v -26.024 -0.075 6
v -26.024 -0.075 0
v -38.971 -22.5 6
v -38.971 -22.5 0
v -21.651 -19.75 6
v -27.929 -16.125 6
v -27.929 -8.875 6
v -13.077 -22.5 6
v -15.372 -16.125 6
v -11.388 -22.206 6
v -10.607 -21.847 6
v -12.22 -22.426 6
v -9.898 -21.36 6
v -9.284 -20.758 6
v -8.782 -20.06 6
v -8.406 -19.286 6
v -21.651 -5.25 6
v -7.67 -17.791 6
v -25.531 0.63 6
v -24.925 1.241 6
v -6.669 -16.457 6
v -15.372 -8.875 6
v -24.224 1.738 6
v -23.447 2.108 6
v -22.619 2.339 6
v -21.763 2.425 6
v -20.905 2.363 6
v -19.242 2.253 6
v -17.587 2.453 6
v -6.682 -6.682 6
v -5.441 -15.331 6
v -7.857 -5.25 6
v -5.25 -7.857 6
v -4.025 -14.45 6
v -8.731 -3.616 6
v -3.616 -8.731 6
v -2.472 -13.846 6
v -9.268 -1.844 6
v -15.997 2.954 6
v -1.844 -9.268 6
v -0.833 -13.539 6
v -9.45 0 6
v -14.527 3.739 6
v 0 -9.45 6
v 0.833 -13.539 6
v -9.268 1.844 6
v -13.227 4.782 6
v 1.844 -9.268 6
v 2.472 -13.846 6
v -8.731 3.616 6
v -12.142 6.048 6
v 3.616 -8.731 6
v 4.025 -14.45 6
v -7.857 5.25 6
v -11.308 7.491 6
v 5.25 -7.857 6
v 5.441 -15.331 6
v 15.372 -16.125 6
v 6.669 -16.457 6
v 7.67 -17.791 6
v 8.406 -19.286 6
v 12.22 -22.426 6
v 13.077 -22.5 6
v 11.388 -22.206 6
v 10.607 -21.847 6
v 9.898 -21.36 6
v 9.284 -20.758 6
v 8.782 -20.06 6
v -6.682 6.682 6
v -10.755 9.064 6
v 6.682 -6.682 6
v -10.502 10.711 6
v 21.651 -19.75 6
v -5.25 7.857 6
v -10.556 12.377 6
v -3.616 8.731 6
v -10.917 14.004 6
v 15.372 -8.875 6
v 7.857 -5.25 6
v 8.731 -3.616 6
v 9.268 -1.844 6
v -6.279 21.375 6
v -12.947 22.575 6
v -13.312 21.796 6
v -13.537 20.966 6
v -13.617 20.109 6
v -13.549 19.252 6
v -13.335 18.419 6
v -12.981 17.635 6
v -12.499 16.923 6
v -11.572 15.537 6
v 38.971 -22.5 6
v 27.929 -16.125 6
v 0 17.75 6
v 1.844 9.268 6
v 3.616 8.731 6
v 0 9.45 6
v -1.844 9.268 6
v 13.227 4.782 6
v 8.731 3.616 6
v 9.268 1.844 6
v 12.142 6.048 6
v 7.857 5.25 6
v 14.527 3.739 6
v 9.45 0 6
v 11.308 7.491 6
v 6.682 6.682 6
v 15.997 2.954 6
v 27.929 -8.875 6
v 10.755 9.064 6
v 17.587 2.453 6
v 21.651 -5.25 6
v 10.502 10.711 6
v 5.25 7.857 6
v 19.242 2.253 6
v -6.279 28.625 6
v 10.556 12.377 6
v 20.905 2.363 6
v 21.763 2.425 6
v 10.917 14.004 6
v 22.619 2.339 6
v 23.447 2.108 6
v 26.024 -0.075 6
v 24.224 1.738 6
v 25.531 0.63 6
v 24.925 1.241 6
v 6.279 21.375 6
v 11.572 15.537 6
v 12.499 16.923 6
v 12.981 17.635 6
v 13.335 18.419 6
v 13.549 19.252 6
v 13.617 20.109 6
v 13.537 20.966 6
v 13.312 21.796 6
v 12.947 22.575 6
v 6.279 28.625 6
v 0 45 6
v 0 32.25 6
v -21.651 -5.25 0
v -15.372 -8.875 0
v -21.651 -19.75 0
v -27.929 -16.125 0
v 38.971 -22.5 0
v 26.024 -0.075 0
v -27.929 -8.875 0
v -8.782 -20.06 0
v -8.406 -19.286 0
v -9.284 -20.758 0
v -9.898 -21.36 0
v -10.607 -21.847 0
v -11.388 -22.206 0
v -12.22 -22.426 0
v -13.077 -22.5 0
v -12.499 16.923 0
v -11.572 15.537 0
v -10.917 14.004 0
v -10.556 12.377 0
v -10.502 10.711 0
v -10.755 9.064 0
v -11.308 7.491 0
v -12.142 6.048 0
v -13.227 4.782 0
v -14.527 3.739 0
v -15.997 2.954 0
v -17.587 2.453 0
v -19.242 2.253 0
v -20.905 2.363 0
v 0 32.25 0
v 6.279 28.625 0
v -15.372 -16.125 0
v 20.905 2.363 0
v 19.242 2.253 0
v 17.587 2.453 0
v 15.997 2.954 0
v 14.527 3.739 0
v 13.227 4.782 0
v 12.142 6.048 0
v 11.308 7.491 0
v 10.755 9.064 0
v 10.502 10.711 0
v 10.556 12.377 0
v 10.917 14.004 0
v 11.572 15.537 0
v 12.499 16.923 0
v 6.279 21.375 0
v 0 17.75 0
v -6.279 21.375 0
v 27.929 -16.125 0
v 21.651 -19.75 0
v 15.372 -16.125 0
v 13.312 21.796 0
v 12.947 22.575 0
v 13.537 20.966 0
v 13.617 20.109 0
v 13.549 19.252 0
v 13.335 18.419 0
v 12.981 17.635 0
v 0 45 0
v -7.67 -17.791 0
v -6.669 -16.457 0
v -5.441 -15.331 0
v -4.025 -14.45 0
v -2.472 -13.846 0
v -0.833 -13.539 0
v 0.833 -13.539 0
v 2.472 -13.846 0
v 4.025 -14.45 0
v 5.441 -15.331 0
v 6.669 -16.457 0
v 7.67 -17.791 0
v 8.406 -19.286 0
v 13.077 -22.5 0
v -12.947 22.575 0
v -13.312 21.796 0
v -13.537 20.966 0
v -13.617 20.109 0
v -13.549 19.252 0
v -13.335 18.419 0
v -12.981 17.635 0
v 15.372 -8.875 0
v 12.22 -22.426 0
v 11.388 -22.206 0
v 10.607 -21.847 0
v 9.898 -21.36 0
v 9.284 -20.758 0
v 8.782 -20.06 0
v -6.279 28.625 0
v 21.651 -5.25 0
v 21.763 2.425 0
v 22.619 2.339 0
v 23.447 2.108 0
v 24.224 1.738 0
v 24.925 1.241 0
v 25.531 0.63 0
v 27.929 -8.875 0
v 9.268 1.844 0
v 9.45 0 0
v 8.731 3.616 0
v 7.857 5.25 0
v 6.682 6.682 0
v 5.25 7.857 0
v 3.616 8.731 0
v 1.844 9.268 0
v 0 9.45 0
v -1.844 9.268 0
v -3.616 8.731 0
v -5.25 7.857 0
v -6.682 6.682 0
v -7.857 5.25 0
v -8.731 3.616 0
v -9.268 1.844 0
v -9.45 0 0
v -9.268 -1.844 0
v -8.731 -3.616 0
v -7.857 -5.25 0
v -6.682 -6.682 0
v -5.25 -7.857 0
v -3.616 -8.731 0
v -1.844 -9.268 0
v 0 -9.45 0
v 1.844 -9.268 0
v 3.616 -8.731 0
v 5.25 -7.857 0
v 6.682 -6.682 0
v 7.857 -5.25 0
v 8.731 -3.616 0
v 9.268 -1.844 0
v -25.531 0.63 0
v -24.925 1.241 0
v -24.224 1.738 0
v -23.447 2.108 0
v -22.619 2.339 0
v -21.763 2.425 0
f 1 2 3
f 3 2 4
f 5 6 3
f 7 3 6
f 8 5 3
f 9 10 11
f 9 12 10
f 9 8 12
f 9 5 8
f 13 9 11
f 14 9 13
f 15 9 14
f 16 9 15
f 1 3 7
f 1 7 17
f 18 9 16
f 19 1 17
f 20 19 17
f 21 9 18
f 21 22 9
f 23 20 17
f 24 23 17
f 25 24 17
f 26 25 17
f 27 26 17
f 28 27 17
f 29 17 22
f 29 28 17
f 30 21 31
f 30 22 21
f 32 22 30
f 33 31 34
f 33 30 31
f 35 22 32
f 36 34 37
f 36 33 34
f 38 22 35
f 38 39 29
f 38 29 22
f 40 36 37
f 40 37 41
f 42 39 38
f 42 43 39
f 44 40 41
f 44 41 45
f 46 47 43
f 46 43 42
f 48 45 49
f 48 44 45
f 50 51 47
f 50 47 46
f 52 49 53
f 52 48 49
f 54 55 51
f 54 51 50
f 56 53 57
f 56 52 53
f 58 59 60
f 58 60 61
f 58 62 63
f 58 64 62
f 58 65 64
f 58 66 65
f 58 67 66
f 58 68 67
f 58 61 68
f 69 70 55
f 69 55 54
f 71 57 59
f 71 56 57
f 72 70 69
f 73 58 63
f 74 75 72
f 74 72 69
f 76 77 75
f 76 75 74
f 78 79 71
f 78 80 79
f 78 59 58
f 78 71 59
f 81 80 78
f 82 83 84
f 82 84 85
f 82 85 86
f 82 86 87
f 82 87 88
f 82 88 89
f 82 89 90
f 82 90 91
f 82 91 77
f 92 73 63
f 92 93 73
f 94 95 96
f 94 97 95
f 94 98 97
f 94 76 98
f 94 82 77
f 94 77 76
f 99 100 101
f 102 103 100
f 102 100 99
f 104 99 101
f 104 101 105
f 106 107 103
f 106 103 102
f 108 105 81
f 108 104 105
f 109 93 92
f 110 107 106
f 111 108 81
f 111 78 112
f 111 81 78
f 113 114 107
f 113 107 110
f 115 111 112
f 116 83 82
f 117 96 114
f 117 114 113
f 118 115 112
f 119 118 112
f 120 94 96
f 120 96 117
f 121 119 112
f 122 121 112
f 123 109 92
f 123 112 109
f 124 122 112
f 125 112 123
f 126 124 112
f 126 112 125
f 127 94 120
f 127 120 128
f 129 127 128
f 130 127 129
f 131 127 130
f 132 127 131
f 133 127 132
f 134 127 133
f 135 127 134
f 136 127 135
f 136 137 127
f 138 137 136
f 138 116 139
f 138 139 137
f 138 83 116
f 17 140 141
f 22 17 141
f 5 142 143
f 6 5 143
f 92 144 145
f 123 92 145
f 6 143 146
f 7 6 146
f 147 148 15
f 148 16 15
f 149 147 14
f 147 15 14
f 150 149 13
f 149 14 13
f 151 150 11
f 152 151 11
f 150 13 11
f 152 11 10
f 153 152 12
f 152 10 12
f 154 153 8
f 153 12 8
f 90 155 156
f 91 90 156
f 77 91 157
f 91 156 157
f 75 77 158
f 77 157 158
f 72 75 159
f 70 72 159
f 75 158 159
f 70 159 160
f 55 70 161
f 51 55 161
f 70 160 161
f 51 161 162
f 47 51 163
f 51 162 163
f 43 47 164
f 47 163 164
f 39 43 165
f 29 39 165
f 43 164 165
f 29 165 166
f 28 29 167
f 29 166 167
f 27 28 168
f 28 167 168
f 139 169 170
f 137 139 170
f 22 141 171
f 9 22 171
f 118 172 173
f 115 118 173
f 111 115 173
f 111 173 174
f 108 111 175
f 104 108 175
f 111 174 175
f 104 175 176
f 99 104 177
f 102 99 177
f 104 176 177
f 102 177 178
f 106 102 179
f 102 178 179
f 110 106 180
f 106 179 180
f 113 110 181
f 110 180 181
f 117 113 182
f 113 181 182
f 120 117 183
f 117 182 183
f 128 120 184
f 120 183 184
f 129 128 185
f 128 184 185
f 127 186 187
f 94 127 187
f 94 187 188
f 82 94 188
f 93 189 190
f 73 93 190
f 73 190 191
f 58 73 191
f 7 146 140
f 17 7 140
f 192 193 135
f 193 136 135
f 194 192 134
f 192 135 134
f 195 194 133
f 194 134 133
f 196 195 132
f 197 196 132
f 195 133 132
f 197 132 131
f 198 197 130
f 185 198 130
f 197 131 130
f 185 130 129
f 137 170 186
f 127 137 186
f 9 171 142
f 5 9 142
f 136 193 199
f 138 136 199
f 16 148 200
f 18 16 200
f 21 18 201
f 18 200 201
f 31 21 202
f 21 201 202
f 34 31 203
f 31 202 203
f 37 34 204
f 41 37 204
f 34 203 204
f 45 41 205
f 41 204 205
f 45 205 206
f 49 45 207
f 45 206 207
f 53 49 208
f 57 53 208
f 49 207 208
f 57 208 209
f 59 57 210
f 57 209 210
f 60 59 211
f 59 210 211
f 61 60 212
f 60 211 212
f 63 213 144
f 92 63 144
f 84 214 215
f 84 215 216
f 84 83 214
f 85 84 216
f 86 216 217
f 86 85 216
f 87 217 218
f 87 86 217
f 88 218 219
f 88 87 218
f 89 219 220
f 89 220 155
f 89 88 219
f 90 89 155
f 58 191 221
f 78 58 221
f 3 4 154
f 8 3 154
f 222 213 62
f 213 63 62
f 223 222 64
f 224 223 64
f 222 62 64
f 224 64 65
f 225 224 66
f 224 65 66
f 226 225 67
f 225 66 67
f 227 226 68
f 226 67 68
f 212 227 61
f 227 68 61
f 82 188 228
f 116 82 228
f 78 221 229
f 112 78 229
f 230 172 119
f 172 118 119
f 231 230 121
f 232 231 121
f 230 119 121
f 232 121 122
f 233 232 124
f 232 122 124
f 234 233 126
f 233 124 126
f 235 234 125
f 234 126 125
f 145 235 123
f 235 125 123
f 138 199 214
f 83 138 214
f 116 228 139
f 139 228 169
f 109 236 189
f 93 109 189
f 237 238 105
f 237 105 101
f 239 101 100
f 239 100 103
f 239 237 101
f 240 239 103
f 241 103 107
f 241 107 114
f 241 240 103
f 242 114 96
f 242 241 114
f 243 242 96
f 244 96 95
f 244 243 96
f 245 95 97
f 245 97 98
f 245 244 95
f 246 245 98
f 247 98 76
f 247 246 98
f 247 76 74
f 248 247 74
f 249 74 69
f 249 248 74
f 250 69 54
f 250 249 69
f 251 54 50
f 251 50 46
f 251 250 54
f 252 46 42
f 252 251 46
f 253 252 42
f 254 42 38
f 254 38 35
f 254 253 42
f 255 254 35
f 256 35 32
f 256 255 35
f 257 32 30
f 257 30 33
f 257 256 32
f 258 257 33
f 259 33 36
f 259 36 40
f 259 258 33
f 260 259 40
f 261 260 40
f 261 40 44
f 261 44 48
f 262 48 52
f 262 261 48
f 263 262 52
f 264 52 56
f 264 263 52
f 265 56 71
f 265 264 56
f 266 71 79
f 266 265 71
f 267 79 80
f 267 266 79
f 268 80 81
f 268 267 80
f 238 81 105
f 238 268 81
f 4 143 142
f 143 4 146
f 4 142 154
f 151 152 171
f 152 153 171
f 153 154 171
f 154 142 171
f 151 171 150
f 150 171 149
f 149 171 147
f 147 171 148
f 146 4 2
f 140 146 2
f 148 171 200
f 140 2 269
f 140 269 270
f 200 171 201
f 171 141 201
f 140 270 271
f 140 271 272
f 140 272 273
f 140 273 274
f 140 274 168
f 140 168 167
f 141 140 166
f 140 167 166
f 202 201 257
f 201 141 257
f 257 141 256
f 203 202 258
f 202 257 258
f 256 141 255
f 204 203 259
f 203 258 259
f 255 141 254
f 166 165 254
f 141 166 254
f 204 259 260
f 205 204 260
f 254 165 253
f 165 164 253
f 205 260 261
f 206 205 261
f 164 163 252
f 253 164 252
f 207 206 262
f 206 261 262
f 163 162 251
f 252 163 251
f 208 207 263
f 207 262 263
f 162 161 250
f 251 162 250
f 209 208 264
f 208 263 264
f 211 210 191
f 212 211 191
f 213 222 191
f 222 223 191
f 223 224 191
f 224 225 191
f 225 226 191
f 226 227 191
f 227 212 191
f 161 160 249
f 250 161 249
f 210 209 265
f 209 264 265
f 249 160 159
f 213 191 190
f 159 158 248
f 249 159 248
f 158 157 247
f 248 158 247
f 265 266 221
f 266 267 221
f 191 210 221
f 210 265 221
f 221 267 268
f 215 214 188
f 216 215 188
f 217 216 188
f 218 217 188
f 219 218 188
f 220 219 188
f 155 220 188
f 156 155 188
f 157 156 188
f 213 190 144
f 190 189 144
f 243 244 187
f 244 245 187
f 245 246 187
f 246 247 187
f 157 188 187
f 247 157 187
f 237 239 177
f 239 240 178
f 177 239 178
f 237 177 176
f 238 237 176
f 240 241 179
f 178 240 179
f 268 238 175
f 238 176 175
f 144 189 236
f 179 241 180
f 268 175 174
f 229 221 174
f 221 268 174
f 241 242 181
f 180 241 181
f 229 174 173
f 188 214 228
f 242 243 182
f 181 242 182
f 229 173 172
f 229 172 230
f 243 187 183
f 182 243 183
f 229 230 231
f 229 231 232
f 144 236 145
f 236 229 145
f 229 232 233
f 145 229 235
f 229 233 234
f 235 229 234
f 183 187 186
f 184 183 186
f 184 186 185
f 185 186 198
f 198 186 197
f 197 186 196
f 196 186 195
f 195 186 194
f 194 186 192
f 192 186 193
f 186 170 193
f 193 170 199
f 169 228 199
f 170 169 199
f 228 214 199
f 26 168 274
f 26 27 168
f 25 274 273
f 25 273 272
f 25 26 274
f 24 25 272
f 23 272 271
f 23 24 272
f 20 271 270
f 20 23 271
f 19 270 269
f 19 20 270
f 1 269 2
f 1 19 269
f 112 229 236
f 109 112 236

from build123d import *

# Parameters (mm, degrees)
F0_R     = 9.45
F1_DEPTH = 6
F2_R     = 5


with BuildPart() as f1:
    # F0 (on Top) → F1 (new body)
    with BuildSketch(Plane.XY):
        with BuildLine():
            Line((14.9855715851, 19.0442286341), (0, 45))
            Line((0, 45), (-14.9855715851, 19.0442286341))
            ThreePointArc((-14.9855715851, 19.0442286341), (-11.6913429511, 6.75), (-23.9855715851, 3.4557713659))
            Line((-23.9855715851, 3.4557713659), (-38.9711431703, -22.5))
            Line((-38.9711431703, -22.5), (-9, -22.5))
            ThreePointArc((-9, -22.5), (0, -13.5), (9, -22.5))
            Line((9, -22.5), (38.9711431703, -22.5))
            Line((38.9711431703, -22.5), (23.9855715851, 3.4557713659))
            ThreePointArc((23.9855715851, 3.4557713659), (11.6913429511, 6.75), (14.9855715851, 19.0442286341))
        make_face()
        Polygon((-15.3719509172, -16.125), (-21.6506350946, -19.75), (-27.929319272, -16.125), (-27.929319272, -8.875), (-21.6506350946, -5.25), (-15.3719509172, -8.875), align=None, mode=Mode.SUBTRACT)
        Polygon((21.6506350946, -5.25), (27.929319272, -8.875), (27.929319272, -16.125), (21.6506350946, -19.75), (15.3719509172, -16.125), (15.3719509172, -8.875), align=None, mode=Mode.SUBTRACT)
        Circle(F0_R, mode=Mode.SUBTRACT)
        Polygon((-6.2786841774, 28.625), (0, 32.25), (6.2786841774, 28.625), (6.2786841774, 21.375), (0, 17.75), (-6.2786841774, 21.375), align=None, mode=Mode.SUBTRACT)
    extrude(amount=F1_DEPTH)

    # F2
    f2_edges = [f1.edges().sort_by_distance(p)[0] for p in [
        (14.985572, 19.044229, 3),
        (-23.985572, 3.455771, 3),
        (9, -22.5, 3),
        (-14.985572, 19.044229, 3),
        (-9, -22.5, 3),
        (23.985572, 3.455771, 3),
    ]]
    fillet(f2_edges, radius=F2_R)


solid = f1.part
